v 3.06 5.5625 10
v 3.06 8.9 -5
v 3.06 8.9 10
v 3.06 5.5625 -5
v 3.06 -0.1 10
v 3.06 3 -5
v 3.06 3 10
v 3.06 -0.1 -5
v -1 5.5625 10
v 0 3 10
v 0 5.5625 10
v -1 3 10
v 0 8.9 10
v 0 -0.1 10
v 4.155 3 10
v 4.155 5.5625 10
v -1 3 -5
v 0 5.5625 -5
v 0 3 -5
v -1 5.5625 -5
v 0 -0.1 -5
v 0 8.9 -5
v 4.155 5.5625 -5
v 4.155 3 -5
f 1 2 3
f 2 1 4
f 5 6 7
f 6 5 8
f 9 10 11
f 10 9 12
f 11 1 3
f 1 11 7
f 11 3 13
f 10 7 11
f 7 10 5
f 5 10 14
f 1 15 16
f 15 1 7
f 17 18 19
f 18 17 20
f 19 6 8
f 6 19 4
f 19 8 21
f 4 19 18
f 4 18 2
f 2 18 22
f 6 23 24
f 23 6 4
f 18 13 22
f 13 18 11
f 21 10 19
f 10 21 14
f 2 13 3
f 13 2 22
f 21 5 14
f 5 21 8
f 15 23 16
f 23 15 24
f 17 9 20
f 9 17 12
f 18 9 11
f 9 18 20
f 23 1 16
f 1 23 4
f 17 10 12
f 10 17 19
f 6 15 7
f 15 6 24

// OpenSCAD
// file: dimensions.scad
panel_thickness = 5;

bezel_width = 140;
bezel_height = 85;
bezel_corner_radius = 3;
bezel_screw_hole_dia = 3.5;
bezel_angle = 70; // degrees

tab_tolerance_coeff = 1.025;
tab_width = 15;

floor_width = bezel_width - (panel_thickness * 4);
floor_depth = 120;
floor_height_above_bottom = 10; 

sma_bulkhead_radius = 3.25;
sma_bulkhead_flat_radius = 3;

roof_width = 100;
roof_depth = 80;
roof_height_below_top = 5; 

side_height = 100;
side_depth  = floor_depth;
side_corner_radius = 1.5;
chin_depth = 42;


// Pi standoff holes
// All measurements taken from https://www.raspberrypi.org/documentation/hardware/raspberrypi/mechanical/rpi_MECH_3bplus.pdf
// Top left etc relative to drawing
// 0,0 of drawing is bottom left corner

pi_width = 85;
pi_depth = 56;
pi_hole_dia = 2.75;
pi_hole_radius = pi_hole_dia / 2;
standoff_dia = pi_hole_dia * 2;
standoff_radius = standoff_dia / 2;
standoff_height = 3;
pi_standoff_holes = [
    [3.5, 3.5],           // bottom left
    [3.5+58, 3.5],      // bottom right
    [3.5, 3.5+49],      // top left
    [3.5+58, 3.5+49], // top right
];


m3_bolt_thread_len = 8;
m3_bolt_dia = 3;
m3_bolt_clearance_coeff = 1.02;
m3_bolt_slot_dia = m3_bolt_dia * m3_bolt_clearance_coeff;
m3_bolt_slot_len = m3_bolt_thread_len + 1;
m3_nut_flats_dia = 5.5;
m3_nut_clearance_coeff = 1.025;
m3_nut_points_dia = 6;
m3_nut_depth = 2.5;
m3_nut_slot_width = ((m3_nut_flats_dia * m3_nut_clearance_coeff) - m3_bolt_slot_dia) * 2;
m3_nut_slot_depth = m3_nut_depth * m3_nut_clearance_coeff;
   
// main file
$fn = 64;

include <dimensions.scad>;

module m3_captive_nut_slot() {
    translate([0, -0.1, -panel_thickness]) {
        cube([
            m3_bolt_slot_dia,
            m3_bolt_slot_len,
            panel_thickness * 3
        ]);
    }
    translate([-1, m3_bolt_slot_len / 3, -panel_thickness])
        cube([
            m3_nut_slot_width,
            m3_nut_slot_depth, 
            panel_thickness * 3
        ]);
}


m3_captive_nut_slot();
